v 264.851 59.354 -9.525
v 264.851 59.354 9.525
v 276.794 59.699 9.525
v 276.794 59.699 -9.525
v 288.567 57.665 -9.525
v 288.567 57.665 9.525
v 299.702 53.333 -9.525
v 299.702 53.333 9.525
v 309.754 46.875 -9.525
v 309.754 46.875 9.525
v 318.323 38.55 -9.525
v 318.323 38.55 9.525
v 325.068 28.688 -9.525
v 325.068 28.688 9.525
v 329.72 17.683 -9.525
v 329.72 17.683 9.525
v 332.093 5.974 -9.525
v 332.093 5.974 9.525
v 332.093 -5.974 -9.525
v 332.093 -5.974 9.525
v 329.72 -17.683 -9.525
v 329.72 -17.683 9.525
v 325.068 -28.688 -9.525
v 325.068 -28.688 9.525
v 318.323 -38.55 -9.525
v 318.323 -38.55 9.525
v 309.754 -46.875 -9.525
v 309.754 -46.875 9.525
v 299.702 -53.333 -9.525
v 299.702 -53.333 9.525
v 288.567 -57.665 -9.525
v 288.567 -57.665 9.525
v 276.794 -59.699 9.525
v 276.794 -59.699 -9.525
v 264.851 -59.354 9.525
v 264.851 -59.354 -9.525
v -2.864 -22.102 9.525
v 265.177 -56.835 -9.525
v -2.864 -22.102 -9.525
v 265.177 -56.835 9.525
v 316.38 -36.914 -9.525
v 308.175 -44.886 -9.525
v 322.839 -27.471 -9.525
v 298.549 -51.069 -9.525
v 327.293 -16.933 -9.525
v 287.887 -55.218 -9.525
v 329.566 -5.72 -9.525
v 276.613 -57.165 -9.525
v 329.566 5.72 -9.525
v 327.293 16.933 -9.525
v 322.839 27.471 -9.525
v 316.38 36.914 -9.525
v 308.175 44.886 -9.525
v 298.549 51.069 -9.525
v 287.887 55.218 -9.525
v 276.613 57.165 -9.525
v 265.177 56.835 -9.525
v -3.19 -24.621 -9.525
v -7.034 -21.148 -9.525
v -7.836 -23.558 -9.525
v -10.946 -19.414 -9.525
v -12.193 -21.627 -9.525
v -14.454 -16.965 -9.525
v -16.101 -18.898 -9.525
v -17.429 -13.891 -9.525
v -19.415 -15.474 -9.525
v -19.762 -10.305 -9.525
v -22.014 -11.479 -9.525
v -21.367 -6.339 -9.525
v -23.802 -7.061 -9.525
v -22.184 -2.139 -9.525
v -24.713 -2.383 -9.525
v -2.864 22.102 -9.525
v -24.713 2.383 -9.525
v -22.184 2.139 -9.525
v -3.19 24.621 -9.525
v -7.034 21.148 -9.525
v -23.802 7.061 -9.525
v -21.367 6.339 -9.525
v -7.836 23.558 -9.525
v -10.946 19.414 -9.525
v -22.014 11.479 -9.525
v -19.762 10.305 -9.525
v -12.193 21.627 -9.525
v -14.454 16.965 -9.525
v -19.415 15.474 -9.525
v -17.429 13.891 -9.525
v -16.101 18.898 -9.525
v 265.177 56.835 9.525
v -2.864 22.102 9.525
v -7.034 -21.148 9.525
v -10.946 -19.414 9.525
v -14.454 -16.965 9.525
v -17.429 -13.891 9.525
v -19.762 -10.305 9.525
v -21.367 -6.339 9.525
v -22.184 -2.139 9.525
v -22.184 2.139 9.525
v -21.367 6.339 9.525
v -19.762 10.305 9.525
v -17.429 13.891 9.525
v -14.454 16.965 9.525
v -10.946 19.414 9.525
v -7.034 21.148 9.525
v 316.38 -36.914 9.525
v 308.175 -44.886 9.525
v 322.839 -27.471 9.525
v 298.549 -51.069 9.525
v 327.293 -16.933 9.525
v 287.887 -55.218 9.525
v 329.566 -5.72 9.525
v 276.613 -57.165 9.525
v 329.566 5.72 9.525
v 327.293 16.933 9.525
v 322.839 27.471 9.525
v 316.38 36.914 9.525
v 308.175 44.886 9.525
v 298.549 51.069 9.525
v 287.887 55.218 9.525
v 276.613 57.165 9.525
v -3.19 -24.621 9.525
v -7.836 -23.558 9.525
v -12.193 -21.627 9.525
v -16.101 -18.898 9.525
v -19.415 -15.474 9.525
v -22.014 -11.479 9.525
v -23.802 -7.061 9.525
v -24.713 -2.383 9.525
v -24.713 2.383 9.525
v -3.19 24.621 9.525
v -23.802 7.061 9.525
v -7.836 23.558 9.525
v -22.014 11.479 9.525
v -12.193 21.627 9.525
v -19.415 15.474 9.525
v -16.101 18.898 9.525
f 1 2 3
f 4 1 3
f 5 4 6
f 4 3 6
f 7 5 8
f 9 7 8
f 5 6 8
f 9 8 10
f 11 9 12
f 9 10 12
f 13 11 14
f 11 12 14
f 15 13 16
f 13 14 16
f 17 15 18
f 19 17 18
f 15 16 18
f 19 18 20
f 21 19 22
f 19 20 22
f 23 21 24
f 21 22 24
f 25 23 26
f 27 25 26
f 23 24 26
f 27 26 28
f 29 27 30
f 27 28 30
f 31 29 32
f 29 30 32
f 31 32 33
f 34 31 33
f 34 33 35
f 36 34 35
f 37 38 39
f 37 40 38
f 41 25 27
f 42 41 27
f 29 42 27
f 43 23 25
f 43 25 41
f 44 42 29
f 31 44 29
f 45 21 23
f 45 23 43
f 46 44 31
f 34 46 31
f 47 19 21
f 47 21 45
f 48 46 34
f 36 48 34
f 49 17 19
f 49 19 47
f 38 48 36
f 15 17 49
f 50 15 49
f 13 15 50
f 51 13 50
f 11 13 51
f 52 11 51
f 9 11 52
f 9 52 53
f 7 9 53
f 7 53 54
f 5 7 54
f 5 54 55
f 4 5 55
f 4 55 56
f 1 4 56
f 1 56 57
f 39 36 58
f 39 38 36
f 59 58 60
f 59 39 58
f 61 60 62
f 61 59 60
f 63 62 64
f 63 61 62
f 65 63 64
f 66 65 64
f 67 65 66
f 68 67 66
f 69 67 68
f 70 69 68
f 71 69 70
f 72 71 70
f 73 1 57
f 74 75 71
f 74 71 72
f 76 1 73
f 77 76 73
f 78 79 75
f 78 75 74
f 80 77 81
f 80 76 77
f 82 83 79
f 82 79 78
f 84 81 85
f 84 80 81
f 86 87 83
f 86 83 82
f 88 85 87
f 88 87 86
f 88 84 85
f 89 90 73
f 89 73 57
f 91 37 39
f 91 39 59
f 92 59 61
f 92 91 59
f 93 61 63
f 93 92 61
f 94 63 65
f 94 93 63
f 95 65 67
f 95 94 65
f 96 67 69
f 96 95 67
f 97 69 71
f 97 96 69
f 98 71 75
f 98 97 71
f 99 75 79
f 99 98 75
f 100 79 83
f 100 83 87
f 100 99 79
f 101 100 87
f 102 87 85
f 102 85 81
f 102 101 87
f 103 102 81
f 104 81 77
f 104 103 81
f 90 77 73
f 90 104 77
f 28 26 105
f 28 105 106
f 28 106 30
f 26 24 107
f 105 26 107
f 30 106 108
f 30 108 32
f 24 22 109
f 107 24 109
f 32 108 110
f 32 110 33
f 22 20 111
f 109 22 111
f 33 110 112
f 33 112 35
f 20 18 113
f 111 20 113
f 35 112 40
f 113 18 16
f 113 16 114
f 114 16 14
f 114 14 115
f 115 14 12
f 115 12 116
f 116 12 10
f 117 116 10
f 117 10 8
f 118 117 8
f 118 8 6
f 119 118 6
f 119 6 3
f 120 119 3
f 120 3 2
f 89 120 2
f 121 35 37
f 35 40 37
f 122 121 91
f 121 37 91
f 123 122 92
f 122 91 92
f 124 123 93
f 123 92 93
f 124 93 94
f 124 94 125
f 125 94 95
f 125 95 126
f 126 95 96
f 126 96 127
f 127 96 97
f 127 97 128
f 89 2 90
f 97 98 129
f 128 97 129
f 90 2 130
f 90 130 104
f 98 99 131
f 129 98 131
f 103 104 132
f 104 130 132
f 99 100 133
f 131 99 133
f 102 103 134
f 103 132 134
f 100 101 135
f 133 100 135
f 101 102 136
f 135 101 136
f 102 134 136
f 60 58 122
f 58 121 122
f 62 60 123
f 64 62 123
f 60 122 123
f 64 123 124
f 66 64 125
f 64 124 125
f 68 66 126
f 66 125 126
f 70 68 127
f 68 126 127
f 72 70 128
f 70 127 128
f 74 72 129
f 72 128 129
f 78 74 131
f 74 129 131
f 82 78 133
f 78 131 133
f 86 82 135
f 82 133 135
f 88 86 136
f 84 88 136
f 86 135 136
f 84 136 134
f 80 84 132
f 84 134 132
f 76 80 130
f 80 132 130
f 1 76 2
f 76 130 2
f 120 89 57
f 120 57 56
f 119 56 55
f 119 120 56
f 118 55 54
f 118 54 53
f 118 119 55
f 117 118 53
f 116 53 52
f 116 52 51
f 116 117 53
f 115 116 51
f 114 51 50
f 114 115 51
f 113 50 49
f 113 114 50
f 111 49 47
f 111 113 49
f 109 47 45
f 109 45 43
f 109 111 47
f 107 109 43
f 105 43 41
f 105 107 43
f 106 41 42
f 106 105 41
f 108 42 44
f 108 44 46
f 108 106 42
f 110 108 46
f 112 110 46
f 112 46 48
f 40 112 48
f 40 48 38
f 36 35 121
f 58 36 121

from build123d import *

# Parameters (mm, degrees)
EXTRUDE_THIN1_DEPTH      = 9.525
EXTRUDE_THIN1_DEPTH_BACK = 9.525


with BuildPart() as part:
    # Sketch1 → Extrude-Thin1 (new body, two sides)
    with BuildSketch(Plane.XY) as extrude_thin1_sk:
        with BuildLine():
            Line((264.851021428, -59.353801417), (-3.190403177, -24.621386578))
            ThreePointArc((-3.190403177, -24.621386578), (-24.82723, 0), (-3.190403177, 24.621386578))
            Line((-3.190403177, 24.621386578), (264.851021428, 59.353801417))
            ThreePointArc((264.851021428, 59.353801417), (332.39202, 0), (264.851021428, -59.353801417))
        make_face()
        with BuildLine():
            Line((265.17742208, -56.834860644), (-2.864002524, -22.102445806))
            ThreePointArc((-2.864002524, -22.102445806), (-22.28723, 0), (-2.864002524, 22.102445806))
            Line((-2.864002524, 22.102445806), (265.17742208, 56.834860644))
            ThreePointArc((265.17742208, 56.834860644), (329.85202, 0), (265.17742208, -56.834860644))
        make_face(mode=Mode.SUBTRACT)
    extrude(amount=EXTRUDE_THIN1_DEPTH)
    extrude(extrude_thin1_sk.sketch, amount=-EXTRUDE_THIN1_DEPTH_BACK)


solid = part.part
